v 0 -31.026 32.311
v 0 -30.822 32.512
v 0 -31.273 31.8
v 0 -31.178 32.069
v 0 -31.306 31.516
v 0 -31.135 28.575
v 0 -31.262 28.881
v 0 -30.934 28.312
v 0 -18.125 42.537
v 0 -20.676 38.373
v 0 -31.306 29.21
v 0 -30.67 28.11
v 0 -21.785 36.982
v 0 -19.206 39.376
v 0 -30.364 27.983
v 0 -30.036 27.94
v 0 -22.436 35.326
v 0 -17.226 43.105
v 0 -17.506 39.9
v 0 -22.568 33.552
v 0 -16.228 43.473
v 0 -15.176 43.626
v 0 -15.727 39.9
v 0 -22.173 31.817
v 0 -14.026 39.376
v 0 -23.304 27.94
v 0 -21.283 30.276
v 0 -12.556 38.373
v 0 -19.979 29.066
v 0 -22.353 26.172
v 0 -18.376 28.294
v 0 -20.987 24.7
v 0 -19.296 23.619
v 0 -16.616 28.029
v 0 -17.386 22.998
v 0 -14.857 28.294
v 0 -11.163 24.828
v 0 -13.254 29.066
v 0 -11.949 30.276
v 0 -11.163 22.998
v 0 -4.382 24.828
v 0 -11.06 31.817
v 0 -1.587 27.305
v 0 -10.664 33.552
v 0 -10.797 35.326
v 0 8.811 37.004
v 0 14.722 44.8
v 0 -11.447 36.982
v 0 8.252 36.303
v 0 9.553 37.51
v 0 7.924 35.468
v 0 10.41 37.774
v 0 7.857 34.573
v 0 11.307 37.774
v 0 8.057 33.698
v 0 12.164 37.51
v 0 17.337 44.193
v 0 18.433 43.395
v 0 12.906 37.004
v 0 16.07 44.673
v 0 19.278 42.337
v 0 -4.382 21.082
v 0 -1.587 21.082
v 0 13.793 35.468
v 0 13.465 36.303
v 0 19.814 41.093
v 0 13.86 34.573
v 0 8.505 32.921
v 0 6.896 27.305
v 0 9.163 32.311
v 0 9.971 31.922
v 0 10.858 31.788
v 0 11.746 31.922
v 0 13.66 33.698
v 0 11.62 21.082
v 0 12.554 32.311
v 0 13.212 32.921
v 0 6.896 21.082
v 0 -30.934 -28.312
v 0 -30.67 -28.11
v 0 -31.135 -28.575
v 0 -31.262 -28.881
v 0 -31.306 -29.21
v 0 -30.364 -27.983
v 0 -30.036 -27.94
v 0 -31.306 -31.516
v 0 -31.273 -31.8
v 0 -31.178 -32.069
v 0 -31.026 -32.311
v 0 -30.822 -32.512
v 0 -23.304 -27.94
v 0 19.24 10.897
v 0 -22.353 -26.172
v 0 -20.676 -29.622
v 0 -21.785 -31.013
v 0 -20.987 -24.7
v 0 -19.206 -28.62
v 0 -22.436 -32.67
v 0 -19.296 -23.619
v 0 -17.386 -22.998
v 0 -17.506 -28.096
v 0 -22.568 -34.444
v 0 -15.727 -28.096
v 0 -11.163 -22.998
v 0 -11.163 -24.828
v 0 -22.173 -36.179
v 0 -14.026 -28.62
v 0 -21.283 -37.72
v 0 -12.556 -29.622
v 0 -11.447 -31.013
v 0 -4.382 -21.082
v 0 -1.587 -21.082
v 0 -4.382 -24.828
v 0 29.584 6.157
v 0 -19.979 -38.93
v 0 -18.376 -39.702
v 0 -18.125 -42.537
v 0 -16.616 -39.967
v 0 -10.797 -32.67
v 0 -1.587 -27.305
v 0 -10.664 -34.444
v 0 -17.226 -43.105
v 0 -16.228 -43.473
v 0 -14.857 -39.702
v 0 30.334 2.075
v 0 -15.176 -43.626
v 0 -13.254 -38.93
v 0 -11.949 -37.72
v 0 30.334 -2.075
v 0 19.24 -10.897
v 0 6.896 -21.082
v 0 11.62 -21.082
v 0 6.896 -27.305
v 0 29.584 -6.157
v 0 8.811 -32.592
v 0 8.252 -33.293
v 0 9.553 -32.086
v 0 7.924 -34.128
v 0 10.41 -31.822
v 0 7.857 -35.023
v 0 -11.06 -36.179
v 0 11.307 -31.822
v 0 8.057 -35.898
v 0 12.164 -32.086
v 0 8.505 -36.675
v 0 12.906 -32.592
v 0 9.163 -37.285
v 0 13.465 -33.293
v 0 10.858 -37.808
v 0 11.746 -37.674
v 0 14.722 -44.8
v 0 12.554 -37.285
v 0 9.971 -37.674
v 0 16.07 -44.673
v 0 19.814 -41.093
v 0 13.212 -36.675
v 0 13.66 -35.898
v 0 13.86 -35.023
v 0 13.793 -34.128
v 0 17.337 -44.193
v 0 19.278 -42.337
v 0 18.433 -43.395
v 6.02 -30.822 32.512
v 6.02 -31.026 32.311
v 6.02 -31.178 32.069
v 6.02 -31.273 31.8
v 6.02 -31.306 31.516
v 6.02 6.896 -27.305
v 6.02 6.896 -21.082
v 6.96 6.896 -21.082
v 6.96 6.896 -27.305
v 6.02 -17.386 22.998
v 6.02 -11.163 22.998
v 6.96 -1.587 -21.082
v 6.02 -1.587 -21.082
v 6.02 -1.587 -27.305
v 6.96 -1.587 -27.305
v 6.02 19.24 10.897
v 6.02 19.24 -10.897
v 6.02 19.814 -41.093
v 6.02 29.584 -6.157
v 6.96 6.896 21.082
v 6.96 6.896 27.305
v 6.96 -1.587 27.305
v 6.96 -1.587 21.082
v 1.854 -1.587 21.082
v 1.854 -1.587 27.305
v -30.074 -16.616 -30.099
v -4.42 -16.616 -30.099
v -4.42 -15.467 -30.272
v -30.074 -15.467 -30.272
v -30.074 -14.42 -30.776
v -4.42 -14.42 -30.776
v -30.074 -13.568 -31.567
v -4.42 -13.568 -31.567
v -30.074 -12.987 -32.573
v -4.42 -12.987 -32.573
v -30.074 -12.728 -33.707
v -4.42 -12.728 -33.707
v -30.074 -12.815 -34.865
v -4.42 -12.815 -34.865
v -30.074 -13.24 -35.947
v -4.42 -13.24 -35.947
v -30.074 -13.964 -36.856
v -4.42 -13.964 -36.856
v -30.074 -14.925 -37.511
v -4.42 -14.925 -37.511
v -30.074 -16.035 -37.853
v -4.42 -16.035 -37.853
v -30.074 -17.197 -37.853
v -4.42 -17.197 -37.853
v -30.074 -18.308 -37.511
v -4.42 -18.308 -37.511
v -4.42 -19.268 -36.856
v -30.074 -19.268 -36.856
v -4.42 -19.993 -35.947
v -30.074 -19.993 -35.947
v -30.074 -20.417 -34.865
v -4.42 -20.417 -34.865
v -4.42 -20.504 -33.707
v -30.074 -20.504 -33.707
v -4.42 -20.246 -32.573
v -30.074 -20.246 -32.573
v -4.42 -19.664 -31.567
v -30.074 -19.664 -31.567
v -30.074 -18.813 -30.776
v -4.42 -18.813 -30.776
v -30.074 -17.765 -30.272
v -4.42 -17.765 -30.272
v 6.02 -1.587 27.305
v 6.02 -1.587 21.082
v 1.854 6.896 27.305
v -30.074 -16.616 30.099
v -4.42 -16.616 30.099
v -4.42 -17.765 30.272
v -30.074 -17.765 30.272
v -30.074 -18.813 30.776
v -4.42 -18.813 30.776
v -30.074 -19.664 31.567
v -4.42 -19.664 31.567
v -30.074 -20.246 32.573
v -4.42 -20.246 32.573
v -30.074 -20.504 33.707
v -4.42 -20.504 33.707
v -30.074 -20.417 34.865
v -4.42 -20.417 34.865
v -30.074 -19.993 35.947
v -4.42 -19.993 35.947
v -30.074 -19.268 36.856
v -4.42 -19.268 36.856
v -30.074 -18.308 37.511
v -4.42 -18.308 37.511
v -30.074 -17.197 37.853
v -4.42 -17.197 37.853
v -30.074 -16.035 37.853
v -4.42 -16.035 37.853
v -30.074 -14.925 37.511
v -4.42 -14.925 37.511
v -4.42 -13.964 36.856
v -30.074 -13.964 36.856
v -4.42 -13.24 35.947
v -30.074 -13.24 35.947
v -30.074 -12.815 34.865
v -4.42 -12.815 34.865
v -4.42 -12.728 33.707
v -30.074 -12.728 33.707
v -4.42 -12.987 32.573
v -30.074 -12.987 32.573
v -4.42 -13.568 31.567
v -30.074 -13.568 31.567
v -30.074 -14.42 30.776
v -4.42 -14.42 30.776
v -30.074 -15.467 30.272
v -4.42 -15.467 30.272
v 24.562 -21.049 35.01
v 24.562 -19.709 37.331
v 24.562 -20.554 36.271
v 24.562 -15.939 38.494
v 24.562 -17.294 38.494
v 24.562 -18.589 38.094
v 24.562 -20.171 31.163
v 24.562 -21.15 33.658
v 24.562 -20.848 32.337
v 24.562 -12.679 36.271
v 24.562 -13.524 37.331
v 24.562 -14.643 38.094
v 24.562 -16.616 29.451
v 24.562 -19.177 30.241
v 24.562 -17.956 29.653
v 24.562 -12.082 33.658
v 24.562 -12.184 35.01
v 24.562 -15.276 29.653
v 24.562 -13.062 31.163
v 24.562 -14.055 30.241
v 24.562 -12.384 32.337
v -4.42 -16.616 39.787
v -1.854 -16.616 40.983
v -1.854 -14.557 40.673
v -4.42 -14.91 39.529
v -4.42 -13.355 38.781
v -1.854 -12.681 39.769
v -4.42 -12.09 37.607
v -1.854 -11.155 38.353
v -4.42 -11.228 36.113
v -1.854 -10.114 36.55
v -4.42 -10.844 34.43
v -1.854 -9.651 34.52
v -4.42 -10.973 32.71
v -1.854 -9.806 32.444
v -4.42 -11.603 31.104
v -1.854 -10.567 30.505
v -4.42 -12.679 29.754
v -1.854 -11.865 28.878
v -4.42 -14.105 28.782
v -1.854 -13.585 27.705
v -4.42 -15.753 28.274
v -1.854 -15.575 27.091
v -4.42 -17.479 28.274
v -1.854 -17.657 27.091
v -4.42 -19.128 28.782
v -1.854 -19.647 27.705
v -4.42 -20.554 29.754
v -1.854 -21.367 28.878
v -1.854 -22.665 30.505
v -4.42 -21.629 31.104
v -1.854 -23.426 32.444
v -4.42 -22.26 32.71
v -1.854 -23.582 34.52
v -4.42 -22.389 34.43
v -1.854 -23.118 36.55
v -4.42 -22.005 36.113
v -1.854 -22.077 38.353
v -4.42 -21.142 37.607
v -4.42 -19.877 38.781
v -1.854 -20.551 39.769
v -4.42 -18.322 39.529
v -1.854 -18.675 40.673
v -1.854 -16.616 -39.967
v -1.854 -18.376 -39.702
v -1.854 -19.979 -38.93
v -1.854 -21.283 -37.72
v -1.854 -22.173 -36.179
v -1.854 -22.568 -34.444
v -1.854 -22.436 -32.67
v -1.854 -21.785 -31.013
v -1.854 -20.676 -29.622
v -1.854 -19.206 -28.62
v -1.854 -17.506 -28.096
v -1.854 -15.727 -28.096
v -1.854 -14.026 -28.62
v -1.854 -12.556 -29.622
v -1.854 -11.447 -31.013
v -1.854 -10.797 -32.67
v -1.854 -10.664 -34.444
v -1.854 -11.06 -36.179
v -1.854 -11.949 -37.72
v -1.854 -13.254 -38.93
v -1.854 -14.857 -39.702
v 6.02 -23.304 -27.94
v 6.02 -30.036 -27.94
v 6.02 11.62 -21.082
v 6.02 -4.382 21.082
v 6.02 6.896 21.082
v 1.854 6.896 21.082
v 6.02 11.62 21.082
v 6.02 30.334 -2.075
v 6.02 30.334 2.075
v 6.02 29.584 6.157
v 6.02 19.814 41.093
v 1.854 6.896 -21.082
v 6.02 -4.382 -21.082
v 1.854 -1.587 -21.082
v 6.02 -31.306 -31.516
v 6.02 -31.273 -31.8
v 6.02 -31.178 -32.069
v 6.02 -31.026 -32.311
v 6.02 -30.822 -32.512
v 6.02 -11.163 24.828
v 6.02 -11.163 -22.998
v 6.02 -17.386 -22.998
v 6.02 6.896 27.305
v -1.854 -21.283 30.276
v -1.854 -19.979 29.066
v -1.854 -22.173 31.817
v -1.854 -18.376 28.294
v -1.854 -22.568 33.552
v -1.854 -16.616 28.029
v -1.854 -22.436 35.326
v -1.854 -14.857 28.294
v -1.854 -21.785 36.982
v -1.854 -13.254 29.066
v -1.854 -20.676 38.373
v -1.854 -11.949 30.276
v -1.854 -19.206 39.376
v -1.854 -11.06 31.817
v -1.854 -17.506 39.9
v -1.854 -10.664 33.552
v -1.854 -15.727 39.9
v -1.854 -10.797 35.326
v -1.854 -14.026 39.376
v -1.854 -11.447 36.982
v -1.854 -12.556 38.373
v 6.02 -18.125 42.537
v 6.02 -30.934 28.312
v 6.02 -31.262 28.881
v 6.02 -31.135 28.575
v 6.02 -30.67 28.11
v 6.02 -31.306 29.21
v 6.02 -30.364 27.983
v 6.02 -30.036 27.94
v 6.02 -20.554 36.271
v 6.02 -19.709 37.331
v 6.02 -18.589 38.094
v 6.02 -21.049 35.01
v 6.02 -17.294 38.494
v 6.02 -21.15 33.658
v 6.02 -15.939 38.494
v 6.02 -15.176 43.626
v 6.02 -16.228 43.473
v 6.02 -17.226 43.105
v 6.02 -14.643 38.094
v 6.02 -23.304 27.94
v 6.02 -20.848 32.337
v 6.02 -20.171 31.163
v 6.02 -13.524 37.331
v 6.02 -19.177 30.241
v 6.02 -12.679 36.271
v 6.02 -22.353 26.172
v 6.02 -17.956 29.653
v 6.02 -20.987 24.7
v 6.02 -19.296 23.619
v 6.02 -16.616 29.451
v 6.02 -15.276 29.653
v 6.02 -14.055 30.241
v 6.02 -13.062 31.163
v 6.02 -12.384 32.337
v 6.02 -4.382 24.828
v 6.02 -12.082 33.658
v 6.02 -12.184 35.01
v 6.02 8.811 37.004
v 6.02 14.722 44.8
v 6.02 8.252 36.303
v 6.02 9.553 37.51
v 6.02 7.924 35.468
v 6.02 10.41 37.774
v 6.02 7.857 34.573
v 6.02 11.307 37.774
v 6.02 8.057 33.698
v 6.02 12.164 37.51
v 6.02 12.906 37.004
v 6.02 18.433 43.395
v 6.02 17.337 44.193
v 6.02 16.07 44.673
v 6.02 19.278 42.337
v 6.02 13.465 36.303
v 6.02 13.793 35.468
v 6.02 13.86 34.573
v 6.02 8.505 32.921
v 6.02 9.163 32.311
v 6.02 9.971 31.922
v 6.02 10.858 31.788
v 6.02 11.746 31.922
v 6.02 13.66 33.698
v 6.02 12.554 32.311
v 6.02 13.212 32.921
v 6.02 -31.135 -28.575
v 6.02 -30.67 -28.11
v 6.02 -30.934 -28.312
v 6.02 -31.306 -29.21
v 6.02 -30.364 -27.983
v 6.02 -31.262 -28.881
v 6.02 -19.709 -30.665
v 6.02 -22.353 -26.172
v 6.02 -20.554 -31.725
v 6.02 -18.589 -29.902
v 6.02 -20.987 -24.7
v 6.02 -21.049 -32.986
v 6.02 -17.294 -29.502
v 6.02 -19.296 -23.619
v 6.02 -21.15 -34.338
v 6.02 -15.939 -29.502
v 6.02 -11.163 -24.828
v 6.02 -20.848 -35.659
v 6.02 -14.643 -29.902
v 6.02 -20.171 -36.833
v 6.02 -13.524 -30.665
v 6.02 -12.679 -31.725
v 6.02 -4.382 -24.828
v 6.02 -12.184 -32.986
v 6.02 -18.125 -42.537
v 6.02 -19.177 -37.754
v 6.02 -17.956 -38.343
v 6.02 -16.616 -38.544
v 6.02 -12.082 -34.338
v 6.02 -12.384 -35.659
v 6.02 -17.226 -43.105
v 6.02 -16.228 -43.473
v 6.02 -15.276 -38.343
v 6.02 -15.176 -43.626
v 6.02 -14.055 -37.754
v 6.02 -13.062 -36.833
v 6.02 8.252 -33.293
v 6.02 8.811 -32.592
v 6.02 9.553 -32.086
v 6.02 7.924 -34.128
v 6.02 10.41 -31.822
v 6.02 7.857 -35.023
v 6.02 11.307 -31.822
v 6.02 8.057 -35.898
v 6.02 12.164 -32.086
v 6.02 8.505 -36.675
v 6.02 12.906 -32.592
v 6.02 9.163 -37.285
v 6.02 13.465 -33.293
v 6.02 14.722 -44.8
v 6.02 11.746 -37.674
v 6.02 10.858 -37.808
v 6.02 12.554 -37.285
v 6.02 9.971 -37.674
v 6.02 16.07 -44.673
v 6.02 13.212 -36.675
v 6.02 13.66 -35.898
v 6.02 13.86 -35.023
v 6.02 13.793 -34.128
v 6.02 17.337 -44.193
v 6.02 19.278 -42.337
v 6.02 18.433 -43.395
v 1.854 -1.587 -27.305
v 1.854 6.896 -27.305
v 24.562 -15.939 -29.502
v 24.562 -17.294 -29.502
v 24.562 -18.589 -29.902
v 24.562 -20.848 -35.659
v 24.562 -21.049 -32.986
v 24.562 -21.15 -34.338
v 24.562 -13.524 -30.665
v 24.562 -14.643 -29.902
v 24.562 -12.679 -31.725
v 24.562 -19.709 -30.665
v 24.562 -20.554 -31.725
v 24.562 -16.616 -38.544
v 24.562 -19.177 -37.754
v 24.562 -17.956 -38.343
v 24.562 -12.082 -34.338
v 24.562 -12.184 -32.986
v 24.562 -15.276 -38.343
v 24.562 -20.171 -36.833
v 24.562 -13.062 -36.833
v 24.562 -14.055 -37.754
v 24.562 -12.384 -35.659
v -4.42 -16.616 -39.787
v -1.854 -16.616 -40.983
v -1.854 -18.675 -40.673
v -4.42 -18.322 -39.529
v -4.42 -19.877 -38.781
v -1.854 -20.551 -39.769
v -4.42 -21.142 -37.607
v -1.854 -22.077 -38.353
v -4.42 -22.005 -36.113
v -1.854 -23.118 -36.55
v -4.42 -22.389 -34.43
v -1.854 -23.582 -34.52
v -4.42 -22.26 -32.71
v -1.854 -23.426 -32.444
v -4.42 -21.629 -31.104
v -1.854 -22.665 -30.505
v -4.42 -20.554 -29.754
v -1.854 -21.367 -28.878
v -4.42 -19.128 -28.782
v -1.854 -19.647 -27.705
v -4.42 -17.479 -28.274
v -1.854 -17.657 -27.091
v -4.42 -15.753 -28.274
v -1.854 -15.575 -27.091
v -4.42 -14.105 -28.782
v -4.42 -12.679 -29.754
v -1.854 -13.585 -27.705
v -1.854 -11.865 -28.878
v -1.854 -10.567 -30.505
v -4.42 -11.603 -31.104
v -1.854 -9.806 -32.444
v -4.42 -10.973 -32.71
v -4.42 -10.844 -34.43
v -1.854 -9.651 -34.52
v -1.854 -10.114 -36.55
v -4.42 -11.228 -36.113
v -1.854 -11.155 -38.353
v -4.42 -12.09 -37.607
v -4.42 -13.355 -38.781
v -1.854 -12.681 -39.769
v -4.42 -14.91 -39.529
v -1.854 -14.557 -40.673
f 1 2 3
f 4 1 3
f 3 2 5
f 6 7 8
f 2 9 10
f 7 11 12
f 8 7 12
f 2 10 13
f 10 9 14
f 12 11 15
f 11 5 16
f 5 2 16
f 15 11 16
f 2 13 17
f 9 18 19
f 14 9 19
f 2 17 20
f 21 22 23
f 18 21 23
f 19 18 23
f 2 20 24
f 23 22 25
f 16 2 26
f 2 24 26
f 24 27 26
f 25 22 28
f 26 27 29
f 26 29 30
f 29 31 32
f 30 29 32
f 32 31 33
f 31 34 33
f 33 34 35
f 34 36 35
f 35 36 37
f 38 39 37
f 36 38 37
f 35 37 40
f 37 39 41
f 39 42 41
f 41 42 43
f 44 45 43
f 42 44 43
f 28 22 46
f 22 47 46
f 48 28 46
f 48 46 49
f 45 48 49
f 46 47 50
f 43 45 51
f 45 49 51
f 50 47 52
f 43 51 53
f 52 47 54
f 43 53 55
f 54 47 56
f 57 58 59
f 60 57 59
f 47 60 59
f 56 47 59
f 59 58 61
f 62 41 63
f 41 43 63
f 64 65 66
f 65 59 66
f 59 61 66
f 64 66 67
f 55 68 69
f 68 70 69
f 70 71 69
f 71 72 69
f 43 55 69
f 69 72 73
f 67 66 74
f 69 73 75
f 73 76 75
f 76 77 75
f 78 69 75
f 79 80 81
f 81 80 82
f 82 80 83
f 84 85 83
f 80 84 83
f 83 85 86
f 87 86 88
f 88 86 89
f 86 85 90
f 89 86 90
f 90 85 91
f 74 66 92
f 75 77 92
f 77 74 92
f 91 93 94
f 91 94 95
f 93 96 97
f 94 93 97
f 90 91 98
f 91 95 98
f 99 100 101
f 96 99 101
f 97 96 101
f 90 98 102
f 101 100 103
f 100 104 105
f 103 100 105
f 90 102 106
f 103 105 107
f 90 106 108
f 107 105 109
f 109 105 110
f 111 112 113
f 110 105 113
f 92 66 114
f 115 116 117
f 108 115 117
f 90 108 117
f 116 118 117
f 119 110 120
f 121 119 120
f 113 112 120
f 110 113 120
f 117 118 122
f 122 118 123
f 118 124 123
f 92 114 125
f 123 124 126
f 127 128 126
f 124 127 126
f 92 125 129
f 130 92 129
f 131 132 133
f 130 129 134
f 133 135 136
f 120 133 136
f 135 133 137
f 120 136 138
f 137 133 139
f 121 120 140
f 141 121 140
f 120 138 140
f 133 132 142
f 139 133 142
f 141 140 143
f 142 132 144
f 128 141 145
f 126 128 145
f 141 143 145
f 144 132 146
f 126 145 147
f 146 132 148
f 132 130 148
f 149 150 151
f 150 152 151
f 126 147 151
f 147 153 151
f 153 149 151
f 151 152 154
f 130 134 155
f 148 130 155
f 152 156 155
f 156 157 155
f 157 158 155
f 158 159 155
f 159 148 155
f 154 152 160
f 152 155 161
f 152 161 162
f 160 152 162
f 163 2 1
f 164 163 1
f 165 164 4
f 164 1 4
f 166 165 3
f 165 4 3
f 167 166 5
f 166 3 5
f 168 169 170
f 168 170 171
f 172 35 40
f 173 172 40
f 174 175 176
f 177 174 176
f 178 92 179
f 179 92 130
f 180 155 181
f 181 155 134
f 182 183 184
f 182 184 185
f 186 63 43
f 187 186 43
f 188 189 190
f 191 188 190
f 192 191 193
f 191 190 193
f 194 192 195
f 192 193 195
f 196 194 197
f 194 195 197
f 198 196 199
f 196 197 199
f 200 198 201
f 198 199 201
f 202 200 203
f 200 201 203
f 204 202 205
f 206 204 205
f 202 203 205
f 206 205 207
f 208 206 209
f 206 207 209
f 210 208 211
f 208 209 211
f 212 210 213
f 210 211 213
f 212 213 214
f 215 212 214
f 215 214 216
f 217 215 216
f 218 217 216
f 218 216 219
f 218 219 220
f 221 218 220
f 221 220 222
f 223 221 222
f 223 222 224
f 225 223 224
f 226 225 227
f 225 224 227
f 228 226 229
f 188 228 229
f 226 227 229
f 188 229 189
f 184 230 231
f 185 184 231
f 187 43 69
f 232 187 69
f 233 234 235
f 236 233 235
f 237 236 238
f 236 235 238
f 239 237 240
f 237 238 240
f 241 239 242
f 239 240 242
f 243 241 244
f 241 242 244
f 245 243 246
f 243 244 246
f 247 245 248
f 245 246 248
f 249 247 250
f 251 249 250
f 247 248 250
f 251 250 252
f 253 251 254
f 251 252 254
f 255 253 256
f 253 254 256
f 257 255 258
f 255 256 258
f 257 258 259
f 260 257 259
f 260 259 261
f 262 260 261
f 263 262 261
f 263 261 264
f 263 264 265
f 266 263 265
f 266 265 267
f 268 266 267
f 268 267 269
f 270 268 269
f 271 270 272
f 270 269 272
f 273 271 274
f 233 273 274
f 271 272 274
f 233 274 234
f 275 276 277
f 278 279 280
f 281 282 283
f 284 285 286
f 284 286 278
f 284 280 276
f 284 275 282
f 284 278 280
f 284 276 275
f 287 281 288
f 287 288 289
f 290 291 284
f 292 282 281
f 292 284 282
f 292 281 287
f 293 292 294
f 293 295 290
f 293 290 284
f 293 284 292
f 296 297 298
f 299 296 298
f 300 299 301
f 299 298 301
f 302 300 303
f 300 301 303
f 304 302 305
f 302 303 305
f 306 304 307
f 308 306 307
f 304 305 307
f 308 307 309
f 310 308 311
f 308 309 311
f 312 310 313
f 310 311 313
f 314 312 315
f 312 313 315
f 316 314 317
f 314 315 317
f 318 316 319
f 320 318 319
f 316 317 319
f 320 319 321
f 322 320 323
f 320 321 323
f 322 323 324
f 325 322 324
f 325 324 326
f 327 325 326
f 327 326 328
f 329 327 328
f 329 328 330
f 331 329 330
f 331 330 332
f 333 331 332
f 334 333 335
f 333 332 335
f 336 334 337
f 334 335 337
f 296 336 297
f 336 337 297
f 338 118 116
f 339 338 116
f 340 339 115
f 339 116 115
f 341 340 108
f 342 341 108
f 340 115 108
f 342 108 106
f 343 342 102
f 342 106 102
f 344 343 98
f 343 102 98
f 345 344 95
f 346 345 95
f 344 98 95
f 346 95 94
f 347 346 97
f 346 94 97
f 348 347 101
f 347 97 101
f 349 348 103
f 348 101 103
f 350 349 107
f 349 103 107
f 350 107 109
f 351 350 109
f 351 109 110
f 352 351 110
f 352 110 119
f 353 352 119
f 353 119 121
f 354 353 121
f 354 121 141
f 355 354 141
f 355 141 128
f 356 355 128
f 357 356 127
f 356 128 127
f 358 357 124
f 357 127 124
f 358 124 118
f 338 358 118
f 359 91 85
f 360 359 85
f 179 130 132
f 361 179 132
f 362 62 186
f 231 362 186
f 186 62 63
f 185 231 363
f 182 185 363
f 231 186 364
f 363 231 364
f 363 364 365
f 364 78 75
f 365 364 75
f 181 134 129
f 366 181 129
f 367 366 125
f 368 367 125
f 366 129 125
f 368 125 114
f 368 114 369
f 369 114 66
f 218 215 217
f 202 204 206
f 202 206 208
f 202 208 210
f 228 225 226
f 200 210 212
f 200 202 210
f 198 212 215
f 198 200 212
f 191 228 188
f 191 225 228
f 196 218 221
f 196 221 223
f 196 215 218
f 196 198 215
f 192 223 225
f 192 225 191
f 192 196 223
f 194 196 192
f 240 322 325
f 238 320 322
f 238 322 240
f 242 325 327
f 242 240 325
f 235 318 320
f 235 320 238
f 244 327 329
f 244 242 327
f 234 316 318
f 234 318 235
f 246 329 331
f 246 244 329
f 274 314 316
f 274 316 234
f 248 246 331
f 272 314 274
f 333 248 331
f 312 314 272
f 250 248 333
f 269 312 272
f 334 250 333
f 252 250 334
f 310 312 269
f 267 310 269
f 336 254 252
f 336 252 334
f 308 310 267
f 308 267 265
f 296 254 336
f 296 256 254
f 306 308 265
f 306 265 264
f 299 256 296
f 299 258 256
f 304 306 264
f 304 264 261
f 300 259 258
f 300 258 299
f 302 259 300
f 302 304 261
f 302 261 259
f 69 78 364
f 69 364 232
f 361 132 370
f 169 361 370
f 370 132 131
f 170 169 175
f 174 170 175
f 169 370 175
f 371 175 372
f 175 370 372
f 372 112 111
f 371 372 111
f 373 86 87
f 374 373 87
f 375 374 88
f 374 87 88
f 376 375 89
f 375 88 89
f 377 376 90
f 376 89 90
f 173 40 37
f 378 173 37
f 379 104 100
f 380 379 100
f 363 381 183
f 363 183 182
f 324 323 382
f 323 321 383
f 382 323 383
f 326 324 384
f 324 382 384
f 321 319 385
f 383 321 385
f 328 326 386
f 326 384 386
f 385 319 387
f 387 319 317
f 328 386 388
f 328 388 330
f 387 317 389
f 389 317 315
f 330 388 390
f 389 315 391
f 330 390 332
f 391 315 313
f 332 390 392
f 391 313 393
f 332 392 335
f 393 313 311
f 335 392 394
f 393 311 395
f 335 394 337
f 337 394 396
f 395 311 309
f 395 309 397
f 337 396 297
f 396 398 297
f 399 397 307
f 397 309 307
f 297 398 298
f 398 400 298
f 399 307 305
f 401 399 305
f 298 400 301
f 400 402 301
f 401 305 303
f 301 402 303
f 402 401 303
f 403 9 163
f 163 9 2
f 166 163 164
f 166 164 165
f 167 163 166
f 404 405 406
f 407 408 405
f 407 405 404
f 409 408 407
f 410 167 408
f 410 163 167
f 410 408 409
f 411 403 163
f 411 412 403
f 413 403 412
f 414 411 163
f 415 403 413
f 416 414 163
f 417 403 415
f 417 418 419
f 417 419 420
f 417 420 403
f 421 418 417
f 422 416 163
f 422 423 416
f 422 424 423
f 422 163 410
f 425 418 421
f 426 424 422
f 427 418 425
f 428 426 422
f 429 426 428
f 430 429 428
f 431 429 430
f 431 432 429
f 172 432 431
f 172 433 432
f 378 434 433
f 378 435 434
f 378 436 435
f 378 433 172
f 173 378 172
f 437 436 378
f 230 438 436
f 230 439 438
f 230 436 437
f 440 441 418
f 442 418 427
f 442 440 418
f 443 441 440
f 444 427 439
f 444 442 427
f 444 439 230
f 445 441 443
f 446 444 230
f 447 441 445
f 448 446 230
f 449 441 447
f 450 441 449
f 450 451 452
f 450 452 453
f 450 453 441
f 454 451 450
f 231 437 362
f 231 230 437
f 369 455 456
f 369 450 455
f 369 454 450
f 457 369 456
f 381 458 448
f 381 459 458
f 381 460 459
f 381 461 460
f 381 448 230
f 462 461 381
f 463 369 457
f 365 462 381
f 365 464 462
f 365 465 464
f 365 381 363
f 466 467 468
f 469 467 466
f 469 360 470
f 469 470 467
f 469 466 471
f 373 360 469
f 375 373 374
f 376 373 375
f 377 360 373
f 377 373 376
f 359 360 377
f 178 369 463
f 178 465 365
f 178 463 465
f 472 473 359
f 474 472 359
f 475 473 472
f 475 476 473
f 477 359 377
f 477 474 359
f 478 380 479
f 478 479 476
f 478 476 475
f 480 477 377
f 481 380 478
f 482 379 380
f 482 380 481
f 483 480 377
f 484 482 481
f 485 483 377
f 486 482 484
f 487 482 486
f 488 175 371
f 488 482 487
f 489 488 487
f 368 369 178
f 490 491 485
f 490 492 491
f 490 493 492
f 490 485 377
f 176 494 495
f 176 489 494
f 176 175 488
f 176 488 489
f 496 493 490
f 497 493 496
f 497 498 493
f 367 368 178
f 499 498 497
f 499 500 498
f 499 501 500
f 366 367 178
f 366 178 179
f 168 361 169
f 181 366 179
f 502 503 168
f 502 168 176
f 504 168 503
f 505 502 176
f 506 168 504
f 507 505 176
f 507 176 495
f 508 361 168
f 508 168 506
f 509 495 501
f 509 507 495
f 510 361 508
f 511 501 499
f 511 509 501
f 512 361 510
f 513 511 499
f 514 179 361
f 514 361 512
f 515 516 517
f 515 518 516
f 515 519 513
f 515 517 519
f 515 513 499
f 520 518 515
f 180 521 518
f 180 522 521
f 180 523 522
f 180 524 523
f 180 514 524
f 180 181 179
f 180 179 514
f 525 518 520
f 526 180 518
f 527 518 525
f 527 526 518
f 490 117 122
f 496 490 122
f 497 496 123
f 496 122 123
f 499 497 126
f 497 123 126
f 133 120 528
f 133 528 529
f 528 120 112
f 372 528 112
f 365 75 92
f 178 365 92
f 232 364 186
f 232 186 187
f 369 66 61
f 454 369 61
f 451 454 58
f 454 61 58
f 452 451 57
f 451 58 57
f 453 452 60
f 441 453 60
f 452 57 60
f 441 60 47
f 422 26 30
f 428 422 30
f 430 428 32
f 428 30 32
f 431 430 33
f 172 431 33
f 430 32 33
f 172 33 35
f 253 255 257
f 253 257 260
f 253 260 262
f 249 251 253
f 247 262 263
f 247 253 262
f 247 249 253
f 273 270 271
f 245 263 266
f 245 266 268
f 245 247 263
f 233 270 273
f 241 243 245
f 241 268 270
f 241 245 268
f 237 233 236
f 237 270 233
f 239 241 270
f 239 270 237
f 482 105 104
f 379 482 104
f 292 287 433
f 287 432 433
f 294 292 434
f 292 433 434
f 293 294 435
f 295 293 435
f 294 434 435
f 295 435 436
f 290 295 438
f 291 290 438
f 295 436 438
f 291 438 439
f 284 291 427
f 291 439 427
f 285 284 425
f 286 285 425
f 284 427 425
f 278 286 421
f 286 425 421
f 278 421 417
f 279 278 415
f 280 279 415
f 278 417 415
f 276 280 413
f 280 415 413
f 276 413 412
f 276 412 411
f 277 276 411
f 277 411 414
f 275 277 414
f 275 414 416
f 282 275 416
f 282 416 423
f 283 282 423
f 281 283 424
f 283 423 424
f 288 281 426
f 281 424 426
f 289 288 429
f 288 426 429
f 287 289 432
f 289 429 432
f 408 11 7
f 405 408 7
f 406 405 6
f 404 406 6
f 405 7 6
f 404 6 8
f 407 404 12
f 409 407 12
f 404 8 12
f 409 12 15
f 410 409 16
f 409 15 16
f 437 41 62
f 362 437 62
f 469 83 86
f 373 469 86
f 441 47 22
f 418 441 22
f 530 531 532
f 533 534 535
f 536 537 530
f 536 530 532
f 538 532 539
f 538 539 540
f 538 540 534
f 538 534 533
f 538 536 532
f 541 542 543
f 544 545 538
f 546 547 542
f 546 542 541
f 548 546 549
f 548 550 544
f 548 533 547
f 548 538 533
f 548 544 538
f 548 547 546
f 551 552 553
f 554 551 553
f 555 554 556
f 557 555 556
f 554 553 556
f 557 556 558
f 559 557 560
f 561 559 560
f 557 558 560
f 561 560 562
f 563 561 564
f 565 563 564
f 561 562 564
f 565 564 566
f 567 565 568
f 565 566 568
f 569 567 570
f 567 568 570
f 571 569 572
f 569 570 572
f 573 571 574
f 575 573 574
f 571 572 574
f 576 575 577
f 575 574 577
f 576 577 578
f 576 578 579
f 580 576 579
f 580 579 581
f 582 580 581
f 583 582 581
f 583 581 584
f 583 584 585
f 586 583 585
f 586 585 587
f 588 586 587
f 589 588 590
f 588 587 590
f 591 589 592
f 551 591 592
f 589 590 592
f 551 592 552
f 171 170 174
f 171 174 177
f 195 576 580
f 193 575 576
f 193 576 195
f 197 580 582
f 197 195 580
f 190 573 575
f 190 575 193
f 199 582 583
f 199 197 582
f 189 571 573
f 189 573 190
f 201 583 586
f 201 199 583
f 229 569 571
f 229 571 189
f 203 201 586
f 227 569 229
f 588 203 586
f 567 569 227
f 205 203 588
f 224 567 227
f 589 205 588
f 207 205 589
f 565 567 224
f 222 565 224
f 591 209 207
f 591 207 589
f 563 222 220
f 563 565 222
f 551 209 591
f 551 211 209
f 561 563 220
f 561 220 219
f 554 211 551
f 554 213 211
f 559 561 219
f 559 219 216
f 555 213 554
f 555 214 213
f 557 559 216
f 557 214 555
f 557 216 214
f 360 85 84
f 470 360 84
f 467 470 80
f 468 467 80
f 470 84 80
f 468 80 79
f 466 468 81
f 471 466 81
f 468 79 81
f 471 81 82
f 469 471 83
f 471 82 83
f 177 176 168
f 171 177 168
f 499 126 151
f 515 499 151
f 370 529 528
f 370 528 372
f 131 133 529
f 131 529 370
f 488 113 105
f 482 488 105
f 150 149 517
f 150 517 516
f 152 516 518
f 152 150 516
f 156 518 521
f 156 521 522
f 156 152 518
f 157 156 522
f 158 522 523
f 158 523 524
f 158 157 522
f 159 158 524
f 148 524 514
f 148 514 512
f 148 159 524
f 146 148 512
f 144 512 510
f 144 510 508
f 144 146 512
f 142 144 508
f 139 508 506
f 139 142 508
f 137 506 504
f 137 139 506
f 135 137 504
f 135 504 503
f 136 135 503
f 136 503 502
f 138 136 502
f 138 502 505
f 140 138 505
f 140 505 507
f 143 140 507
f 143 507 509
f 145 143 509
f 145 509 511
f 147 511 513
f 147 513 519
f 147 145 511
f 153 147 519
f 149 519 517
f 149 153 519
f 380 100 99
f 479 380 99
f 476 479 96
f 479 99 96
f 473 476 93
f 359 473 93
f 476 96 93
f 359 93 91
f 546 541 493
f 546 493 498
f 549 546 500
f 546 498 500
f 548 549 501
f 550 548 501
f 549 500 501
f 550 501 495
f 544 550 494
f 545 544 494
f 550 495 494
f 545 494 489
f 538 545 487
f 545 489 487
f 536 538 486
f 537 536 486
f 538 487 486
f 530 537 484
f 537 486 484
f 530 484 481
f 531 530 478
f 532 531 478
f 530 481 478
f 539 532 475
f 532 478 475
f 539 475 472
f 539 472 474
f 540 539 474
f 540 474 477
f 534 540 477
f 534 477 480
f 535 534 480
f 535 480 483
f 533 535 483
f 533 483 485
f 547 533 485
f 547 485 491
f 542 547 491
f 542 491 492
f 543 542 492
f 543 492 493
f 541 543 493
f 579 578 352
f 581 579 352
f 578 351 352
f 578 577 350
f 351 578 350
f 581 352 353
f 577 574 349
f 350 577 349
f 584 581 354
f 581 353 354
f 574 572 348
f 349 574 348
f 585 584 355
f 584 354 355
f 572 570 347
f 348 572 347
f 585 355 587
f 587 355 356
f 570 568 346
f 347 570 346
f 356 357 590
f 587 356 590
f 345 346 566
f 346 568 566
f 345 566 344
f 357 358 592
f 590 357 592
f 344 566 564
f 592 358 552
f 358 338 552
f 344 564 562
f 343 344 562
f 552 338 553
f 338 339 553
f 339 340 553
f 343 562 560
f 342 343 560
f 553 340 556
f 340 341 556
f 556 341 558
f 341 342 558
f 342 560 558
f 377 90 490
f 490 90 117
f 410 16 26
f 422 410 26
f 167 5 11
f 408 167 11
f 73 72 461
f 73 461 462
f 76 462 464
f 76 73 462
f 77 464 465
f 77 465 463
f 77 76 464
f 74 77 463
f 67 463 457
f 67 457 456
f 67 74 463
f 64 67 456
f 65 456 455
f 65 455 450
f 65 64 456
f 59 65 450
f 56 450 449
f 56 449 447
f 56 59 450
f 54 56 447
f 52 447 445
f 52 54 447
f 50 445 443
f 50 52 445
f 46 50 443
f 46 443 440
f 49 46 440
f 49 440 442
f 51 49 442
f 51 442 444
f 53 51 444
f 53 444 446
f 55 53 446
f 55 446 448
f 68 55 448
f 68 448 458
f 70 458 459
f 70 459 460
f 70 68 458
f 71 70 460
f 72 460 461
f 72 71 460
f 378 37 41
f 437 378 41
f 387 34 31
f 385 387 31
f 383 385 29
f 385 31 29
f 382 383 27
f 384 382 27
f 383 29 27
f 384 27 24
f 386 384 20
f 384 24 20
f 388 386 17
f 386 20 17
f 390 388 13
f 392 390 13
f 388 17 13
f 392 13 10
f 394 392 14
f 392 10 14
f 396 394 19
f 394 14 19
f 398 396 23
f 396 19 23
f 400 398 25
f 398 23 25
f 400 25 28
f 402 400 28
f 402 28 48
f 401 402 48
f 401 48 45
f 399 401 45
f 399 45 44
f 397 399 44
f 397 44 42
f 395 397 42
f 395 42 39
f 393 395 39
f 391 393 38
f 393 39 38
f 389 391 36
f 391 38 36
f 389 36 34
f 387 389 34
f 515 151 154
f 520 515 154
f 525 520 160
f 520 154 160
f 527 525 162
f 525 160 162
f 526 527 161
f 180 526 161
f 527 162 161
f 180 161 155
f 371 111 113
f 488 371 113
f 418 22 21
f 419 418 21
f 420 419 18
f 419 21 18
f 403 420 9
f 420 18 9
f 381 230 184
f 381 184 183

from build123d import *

# Parameters (mm, degrees)
SKETCH2_R           = 3.0099
BOSS_EXTRUDE1_DEPTH = 6.0198
SKETCH3_R           = 4.5466
SKETCH3_W           = 6.223
SKETCH3_H           = 8.4836
BOSS_EXTRUDE2_DEPTH = 0.9398
SKETCH4_R           = 4.5466
BOSS_EXTRUDE3_DEPTH = 17.6022
SKETCH5_W           = 6.223
SKETCH5_H           = 8.4836
CUT_EXTRUDE1_DEPTH  = 1.8542
SKETCH6_R           = 5.969
BOSS_EXTRUDE4_DEPTH = 1.8542
SKETCH9_R           = 6.985
BOSS_EXTRUDE6_DEPTH = 2.5654
DRAFT2_ANGLE        = -25
DRAFT3_ANGLE        = -25
SKETCH12_R          = 3.8989
BOSS_EXTRUDE7_DEPTH = 25.654


with BuildPart() as part:
    # Sketch2 → Boss-Extrude1 (new body)
    with BuildSketch(Plane(origin=(0, 0, 0), x_dir=(0, 0, -1), z_dir=(1, 0, 0))):
        with BuildLine():
            ThreePointArc((-32.512356648, -30.822448246), (-32.069394739, -31.178374506), (-31.515555535, -31.3055))
            Line((-31.515555535, -31.3055), (-29.21, -31.3055))
            ThreePointArc((-29.21, -31.3055), (-28.311974388, -30.933525612), (-27.94, -30.0355))
            Line((-27.94, -30.0355), (-27.94, -23.3045))
            ThreePointArc((-27.94, -23.3045), (-24.700446352, -20.987224463), (-22.998148855, -17.3863))
            Line((-22.998148855, -17.3863), (-22.998148855, -11.1633))
            Line((-22.998148855, -11.1633), (-24.8285, -11.1633))
            Line((-24.8285, -11.1633), (-24.8285, -4.3815))
            Line((-24.8285, -4.3815), (-21.082, -4.3815))
            Line((-21.082, -4.3815), (-21.082, 11.6205))
            Line((-21.082, 11.6205), (-10.8966, 19.2405))
            Line((-10.8966, 19.2405), (10.8966, 19.2405))
            Line((10.8966, 19.2405), (21.082, 11.6205))
            Line((21.082, 11.6205), (21.082, -4.3815))
            Line((21.082, -4.3815), (24.8285, -4.3815))
            Line((24.8285, -4.3815), (24.8285, -11.1633))
            Line((24.8285, -11.1633), (22.998148855, -11.1633))
            Line((22.998148855, -11.1633), (22.998148855, -17.3863))
            ThreePointArc((22.998148855, -17.3863), (24.700446352, -20.987224463), (27.94, -23.3045))
            Line((27.94, -23.3045), (27.94, -30.0355))
            ThreePointArc((27.94, -30.0355), (28.311974388, -30.933525612), (29.21, -31.3055))
            Line((29.21, -31.3055), (31.515555535, -31.3055))
            ThreePointArc((31.515555535, -31.3055), (32.069394739, -31.178374506), (32.512356648, -30.822448246))
            Line((32.512356648, -30.822448246), (42.536992541, -18.124576114))
            ThreePointArc((42.536992541, -18.124576114), (43.315187388, -16.736717659), (43.625872471, -15.176200729))
            Line((43.625872471, -15.176200729), (44.800437362, 14.721814671))
            ThreePointArc((44.800437362, 14.721814671), (43.830873172, 17.911699115), (41.092535101, 19.813519845))
            Line((41.092535101, 19.813519845), (6.15681953, 29.583677589))
            ThreePointArc((6.15681953, 29.583677589), (0, 30.428383513), (-6.15681953, 29.583677589))
            Line((-6.15681953, 29.583677589), (-41.092535101, 19.813519845))
            ThreePointArc((-41.092535101, 19.813519845), (-43.830873172, 17.911699115), (-44.800437362, 14.721814671))
            Line((-44.800437362, 14.721814671), (-43.625872471, -15.176200729))
            ThreePointArc((-43.625872471, -15.176200729), (-43.315187388, -16.736717659), (-42.536992541, -18.124576114))
            Line((-42.536992541, -18.124576114), (-32.512356648, -30.822448246))
        make_face()
        with Locations((-34.798, 10.8585)):
            Circle(SKETCH2_R, mode=Mode.SUBTRACT)
        with Locations((34.798, 10.8585)):
            Circle(SKETCH2_R, mode=Mode.SUBTRACT)
    extrude(amount=BOSS_EXTRUDE1_DEPTH)

    # Sketch3 → Boss-Extrude2 (add)
    with BuildSketch(Plane(origin=(6.0198, 0, 0), x_dir=(0, 0, -1), z_dir=(1, 0, 0))):
        with Locations((33.9979, -16.616175495)):
            Circle(SKETCH3_R)
        with Locations((-33.9979, -16.616175495)):
            Circle(SKETCH3_R)
        with Locations((24.1935, 2.6543)):
            Rectangle(SKETCH3_W, SKETCH3_H)
        with Locations((-24.1935, 2.6543)):
            Rectangle(SKETCH3_W, SKETCH3_H)
    extrude(amount=BOSS_EXTRUDE2_DEPTH)

    # Sketch4 → Boss-Extrude3 (add)
    with BuildSketch(Plane(origin=(6.9596, 0, 0), x_dir=(0, 0, -1), z_dir=(1, 0, 0))):
        with Locations((-33.9979, -16.616175495)):
            Circle(SKETCH4_R)
        with Locations((33.9979, -16.616175495)):
            Circle(SKETCH4_R)
    extrude(amount=BOSS_EXTRUDE3_DEPTH)

    # Sketch5 → Cut-Extrude1 (cut)
    with BuildSketch(Plane.ZY):
        with Locations((-24.1935, 2.6543)):
            Rectangle(SKETCH5_W, SKETCH5_H)
        with Locations((24.1935, 2.6543)):
            Rectangle(SKETCH5_W, SKETCH5_H)
    extrude(amount=-CUT_EXTRUDE1_DEPTH, mode=Mode.SUBTRACT)

    # Sketch6 → Boss-Extrude4 (add)
    with BuildSketch(Plane.ZY):
        with Locations(Location((33.9979, -16.616175495, 0), (0, 0, 180))):
            Circle(SKETCH6_R)
        with Locations(Location((-33.9979, -16.616175495, 0), (0, 0, 180))):
            Circle(SKETCH6_R)
    extrude(amount=BOSS_EXTRUDE4_DEPTH)

    # Sketch9 → Boss-Extrude6 (add)
    with BuildSketch(Plane.ZY.offset(1.8542)):
        with Locations((33.9979, -16.616175495)):
            Circle(SKETCH9_R)
        with Locations(Location((-33.9979, -16.616175495, 0), (0, 0, 180))):
            Circle(SKETCH9_R)
    extrude(amount=BOSS_EXTRUDE6_DEPTH)

    # Draft2
    draft2_faces = [part.faces().sort_by_distance(p)[0] for p in [
        (-3.1369, -16.616175495, -27.0129),
    ]]
    draft(draft2_faces, Plane(origin=(-1.8542, -16.616175495, -33.9979), x_dir=(0, 0, 1), z_dir=(1, 0, 0)), DRAFT2_ANGLE)

    # Draft3
    draft3_faces = [part.faces().sort_by_distance(p)[0] for p in [
        (-3.1369, -16.616175495, 27.0129),
    ]]
    draft(draft3_faces, Plane(origin=(-1.8542, -16.616175495, 33.9979), x_dir=(0, 0, 1), z_dir=(1, 0, 0)), DRAFT3_ANGLE)

    # Sketch12 → Boss-Extrude7 (add)
    with BuildSketch(Plane.ZY.offset(4.4196)):
        with Locations((-33.9979, -16.616175495)):
            Circle(SKETCH12_R)
        with Locations(Location((33.9979, -16.616175495, 0), (0, 0, 180))):
            Circle(SKETCH12_R)
    extrude(amount=BOSS_EXTRUDE7_DEPTH)


solid = part.part
